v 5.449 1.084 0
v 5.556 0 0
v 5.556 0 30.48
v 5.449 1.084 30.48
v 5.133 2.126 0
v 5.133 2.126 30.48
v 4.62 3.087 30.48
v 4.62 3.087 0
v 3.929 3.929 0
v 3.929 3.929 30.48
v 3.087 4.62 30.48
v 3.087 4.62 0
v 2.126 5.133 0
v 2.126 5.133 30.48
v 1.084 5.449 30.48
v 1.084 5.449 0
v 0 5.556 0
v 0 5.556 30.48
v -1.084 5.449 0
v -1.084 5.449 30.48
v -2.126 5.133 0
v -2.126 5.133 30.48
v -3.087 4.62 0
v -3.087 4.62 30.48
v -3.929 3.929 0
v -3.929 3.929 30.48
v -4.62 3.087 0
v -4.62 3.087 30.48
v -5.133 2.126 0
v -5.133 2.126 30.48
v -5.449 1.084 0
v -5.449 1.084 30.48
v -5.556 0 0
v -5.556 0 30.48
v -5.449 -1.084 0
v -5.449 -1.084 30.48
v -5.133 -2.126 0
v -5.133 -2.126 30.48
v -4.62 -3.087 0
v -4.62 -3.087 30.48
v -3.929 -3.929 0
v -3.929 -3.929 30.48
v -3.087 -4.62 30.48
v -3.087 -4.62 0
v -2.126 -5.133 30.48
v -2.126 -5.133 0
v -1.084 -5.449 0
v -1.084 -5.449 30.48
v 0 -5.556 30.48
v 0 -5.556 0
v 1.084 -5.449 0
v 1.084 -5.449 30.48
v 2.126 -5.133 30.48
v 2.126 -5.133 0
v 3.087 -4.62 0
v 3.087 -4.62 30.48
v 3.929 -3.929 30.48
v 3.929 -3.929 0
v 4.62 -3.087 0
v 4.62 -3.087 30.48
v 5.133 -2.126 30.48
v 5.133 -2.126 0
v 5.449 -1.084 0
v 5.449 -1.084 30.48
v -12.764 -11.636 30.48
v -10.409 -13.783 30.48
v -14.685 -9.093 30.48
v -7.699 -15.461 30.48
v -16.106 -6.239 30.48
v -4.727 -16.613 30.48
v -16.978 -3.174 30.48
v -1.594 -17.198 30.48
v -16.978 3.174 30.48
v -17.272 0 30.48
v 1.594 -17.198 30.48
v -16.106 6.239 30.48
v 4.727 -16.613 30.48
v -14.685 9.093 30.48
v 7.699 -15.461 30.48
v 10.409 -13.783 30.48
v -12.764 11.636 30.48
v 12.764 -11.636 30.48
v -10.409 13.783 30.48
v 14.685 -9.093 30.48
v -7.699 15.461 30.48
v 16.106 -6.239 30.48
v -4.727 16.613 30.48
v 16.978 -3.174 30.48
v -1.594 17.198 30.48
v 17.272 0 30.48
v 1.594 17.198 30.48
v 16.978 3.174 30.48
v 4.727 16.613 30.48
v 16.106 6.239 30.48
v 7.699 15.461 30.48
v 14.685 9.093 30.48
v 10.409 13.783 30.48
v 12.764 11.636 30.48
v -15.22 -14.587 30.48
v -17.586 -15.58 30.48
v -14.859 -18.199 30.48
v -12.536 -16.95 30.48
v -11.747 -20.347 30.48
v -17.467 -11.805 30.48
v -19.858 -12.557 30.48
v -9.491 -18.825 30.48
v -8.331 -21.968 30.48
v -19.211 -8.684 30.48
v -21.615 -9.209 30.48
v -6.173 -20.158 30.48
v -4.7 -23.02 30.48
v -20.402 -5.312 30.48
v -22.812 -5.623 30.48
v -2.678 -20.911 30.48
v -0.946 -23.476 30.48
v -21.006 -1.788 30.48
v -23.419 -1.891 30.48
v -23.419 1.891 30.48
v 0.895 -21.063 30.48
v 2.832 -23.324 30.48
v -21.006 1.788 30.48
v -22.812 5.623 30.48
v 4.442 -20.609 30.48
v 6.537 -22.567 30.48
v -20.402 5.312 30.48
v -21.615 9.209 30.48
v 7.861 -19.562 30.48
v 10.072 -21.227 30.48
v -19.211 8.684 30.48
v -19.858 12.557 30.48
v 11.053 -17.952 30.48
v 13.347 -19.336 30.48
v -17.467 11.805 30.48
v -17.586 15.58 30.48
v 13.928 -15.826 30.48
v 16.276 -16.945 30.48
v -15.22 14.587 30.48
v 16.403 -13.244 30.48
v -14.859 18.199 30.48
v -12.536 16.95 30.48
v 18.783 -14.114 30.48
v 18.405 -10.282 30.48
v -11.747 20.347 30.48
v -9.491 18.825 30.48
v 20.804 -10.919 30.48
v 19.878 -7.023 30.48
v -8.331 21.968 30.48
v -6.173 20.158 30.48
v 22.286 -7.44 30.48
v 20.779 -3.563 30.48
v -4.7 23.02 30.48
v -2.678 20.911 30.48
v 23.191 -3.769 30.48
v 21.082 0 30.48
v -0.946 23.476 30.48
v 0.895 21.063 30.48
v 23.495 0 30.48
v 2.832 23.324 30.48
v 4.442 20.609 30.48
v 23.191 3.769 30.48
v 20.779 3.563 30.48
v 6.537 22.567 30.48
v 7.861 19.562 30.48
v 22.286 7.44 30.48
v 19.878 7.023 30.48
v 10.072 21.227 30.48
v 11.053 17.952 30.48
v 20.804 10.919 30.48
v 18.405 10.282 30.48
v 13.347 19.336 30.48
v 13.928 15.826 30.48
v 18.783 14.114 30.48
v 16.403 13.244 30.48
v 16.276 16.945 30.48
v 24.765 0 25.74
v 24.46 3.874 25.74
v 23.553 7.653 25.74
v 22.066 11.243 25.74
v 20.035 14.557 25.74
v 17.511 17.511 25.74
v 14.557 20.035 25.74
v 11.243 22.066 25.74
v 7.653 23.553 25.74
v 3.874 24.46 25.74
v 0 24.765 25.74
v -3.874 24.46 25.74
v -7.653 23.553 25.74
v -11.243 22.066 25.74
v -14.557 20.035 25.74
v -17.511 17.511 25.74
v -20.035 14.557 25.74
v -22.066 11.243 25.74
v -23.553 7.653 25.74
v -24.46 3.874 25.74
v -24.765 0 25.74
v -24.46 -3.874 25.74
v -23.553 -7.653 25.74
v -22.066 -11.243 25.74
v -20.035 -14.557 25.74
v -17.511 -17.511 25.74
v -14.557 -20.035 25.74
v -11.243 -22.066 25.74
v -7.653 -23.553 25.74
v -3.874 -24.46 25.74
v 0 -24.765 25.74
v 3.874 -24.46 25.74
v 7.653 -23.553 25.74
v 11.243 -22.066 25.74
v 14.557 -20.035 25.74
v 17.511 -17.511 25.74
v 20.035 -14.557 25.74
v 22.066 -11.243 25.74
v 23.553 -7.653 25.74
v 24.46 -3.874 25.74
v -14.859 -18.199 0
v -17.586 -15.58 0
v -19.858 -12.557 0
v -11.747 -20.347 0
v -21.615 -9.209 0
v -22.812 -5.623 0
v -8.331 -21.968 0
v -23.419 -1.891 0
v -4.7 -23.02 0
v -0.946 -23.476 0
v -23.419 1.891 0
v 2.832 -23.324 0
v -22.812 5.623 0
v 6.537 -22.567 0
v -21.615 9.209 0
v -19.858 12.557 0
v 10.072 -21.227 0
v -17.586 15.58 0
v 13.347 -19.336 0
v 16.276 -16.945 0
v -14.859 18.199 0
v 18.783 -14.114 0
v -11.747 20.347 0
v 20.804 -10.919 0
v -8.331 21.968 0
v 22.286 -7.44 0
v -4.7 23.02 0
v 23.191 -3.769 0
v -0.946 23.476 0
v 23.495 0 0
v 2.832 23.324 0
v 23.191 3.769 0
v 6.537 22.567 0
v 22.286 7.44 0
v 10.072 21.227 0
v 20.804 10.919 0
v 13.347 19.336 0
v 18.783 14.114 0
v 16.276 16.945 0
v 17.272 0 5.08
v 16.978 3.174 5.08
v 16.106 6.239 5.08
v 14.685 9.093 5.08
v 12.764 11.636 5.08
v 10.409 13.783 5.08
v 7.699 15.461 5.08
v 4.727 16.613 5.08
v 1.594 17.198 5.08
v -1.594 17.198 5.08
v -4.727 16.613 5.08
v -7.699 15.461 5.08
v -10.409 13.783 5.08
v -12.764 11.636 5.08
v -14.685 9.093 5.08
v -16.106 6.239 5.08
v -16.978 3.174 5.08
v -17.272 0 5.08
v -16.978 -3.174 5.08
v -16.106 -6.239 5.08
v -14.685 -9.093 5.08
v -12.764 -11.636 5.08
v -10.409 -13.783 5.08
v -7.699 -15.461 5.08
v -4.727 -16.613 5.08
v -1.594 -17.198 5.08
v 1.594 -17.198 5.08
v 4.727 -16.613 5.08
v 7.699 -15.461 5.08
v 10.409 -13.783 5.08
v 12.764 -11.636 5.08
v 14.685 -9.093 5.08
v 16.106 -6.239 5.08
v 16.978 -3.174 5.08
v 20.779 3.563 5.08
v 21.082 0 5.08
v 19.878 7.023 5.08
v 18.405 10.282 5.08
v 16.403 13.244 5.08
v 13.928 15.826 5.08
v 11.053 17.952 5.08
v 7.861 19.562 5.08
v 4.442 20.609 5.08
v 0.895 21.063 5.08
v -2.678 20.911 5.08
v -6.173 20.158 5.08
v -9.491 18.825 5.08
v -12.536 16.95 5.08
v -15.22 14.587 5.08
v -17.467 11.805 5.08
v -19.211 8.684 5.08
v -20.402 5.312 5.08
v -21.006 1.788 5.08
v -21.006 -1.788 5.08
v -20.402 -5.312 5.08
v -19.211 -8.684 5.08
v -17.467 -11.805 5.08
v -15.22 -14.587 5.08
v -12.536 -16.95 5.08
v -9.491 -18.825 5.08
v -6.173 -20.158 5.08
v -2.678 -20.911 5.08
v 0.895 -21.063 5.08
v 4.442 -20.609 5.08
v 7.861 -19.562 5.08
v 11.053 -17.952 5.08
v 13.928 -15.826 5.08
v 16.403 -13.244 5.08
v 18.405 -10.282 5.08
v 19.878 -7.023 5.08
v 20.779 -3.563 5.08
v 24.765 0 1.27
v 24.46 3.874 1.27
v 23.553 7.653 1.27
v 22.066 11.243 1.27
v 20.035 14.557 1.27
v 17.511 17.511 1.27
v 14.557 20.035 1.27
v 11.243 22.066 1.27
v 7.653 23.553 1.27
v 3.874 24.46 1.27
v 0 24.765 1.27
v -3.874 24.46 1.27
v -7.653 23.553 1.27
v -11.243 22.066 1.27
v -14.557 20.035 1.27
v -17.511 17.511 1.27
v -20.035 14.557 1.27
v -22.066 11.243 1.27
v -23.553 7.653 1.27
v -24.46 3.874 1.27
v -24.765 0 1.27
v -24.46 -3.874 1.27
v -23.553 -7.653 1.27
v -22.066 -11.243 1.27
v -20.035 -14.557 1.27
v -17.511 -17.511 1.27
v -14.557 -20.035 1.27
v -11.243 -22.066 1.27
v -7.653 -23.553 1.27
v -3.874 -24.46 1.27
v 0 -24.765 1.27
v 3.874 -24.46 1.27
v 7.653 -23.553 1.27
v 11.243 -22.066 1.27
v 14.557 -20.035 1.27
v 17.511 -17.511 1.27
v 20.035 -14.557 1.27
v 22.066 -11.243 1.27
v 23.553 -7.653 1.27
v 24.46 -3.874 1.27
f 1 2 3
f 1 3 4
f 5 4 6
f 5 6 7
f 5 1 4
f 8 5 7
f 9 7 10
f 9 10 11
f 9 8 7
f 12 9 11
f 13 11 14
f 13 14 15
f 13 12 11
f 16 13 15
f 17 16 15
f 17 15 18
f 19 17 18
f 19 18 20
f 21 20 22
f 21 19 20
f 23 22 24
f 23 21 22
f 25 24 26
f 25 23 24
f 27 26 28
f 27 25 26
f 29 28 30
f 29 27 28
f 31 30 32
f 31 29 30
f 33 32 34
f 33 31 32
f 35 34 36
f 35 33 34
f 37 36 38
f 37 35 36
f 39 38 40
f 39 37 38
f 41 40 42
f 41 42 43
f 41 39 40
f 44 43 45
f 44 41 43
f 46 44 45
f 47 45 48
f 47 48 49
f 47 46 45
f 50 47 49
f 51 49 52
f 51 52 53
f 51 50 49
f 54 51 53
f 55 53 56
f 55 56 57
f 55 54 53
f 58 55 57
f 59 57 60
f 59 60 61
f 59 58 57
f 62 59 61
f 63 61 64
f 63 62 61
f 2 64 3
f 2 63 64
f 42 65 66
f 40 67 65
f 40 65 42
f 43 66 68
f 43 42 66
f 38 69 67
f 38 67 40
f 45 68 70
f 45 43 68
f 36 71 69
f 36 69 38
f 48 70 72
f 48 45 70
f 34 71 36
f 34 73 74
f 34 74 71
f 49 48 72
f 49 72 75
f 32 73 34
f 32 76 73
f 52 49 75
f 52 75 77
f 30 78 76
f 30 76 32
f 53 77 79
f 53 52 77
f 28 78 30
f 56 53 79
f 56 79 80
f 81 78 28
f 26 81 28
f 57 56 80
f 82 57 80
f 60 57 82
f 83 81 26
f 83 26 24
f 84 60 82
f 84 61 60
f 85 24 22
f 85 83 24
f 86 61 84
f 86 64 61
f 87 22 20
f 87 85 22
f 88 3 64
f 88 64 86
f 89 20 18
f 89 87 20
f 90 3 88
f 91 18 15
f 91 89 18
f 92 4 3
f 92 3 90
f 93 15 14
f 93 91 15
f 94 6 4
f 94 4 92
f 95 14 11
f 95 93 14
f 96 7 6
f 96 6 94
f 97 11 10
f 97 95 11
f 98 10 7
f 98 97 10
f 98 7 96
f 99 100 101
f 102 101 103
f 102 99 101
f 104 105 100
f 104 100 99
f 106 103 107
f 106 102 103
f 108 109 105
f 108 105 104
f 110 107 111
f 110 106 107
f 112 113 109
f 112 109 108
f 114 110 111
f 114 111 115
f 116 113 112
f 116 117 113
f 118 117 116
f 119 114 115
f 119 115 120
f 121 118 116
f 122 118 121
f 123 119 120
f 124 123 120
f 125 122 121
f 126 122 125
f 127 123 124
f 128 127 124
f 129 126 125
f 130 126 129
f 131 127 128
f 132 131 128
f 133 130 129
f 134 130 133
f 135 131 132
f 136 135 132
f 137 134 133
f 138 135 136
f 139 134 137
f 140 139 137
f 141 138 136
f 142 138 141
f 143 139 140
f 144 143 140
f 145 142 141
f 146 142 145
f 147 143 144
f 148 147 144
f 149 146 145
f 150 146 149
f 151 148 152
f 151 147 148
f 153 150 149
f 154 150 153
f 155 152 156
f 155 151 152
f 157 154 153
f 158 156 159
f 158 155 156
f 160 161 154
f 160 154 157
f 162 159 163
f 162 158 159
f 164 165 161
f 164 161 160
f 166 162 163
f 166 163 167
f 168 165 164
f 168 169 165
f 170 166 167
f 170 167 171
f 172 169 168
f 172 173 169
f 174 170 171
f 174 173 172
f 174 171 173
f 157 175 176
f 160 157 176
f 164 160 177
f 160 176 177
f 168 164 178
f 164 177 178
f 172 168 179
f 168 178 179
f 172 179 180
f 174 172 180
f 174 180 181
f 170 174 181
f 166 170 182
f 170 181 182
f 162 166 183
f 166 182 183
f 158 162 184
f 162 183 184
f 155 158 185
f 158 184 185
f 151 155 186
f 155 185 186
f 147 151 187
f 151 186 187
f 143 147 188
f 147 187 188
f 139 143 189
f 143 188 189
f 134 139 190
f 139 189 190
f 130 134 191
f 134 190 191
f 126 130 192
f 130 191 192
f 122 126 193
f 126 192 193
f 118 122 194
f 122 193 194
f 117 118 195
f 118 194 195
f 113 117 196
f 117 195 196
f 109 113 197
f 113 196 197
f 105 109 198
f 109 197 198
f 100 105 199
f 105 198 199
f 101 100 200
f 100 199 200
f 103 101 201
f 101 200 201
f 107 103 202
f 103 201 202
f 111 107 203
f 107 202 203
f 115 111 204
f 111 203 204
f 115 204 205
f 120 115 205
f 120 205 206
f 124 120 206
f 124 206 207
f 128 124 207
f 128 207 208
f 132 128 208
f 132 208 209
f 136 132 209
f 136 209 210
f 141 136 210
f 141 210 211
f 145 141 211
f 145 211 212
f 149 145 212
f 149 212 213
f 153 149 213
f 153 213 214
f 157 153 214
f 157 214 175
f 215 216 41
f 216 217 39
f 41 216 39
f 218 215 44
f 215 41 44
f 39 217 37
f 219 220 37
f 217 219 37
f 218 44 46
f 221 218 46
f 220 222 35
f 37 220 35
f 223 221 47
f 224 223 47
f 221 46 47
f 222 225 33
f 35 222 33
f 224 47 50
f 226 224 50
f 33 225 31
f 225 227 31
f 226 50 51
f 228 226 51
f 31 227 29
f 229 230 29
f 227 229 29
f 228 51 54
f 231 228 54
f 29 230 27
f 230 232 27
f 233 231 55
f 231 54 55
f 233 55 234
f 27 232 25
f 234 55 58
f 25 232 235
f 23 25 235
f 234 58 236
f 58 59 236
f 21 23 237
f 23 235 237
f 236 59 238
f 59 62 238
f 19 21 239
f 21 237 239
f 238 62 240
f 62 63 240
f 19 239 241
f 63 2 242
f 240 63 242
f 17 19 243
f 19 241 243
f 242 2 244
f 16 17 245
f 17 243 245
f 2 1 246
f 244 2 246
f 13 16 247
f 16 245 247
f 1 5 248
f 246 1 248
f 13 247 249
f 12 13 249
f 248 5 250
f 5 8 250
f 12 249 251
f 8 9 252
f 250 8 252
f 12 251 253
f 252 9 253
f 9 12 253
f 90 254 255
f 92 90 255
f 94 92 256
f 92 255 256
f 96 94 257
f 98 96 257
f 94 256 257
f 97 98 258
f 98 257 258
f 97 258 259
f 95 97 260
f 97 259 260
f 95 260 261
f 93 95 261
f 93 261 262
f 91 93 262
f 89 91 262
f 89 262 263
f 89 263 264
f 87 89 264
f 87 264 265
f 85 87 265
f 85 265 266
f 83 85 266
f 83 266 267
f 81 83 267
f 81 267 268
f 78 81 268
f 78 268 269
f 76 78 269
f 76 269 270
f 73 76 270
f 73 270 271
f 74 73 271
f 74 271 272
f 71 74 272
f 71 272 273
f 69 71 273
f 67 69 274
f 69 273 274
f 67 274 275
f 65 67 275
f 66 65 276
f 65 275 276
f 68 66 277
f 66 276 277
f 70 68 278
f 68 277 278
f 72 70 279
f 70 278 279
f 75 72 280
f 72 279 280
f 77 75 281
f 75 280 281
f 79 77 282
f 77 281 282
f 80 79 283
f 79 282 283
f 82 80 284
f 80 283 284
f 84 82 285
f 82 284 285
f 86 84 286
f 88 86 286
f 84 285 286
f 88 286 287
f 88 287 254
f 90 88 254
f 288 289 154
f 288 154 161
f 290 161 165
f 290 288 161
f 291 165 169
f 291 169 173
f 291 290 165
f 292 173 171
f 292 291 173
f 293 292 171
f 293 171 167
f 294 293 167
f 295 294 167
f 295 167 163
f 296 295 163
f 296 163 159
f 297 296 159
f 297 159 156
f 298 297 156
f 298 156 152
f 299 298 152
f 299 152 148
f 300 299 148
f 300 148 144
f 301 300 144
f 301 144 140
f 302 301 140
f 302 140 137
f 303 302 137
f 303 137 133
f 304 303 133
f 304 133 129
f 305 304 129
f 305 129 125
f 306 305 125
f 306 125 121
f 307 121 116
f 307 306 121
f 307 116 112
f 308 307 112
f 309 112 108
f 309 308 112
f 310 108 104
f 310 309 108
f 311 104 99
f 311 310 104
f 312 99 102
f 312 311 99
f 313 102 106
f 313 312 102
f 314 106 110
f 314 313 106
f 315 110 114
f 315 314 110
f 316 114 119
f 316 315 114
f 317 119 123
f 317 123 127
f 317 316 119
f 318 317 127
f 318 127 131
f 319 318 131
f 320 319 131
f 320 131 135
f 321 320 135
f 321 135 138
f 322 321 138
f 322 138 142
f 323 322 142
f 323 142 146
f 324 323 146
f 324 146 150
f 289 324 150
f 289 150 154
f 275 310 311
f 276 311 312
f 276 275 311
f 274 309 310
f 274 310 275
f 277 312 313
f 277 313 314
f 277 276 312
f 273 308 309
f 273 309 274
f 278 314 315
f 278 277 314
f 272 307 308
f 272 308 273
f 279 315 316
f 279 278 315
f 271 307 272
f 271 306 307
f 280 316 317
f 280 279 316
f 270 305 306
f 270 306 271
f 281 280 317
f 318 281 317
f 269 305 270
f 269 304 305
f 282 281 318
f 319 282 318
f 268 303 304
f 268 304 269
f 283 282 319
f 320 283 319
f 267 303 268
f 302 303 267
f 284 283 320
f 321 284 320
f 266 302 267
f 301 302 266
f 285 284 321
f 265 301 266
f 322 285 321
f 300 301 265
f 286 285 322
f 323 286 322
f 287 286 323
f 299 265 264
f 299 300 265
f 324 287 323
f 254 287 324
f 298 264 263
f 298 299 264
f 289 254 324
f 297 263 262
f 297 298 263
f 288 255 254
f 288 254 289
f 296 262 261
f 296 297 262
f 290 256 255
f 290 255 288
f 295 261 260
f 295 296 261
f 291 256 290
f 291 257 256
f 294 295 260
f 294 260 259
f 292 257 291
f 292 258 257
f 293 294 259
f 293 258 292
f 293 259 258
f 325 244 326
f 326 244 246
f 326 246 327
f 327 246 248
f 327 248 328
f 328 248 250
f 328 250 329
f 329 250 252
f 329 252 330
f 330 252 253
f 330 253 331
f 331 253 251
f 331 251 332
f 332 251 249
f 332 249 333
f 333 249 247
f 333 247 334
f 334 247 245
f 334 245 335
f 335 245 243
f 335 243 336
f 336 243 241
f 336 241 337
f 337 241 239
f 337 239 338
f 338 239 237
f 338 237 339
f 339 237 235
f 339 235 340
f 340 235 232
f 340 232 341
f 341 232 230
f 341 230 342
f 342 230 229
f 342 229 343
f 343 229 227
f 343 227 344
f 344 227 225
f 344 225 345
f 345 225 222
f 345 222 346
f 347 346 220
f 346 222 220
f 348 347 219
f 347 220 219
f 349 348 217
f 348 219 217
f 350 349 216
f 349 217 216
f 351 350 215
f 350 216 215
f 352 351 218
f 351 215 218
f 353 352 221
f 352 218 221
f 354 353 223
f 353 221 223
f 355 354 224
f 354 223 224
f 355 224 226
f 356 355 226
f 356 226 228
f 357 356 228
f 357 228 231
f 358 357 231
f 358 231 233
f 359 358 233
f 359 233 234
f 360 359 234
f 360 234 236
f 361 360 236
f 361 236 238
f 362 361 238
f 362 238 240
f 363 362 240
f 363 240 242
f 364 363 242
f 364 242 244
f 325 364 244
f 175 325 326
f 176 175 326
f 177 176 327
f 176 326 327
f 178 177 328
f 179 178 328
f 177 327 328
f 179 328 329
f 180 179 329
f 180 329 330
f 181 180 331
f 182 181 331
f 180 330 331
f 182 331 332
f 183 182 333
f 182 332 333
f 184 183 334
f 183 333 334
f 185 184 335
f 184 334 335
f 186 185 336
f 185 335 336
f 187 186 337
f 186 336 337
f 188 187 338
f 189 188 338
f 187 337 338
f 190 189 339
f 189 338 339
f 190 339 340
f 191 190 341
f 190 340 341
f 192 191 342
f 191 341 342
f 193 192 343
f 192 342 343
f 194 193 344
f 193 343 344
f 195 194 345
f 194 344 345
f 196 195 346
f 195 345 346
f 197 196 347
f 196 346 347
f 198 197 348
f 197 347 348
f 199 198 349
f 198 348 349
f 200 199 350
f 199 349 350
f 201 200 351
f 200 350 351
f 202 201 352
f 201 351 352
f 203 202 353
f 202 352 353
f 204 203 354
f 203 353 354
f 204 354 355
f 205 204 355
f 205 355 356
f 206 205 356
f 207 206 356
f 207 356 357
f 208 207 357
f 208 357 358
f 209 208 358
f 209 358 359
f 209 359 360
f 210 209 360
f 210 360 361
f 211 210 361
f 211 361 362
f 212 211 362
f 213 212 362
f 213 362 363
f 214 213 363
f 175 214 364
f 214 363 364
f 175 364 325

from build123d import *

# Parameters (mm, degrees)
F0_R     = 24.765
F0_R_2   = 21.082
F1_DEPTH = 30.48
F0_R_3   = 17.272
F0_R_4   = 5.55625
F2_DEPTH = 5.08
F3_SIZE2 = 4.7397045256
F3_SIZE  = 1.27
F4_SIZE  = 1.27


with BuildPart() as f1:
    # F0 (on Top) → F1 (new body)
    with BuildSketch(Plane.XY):
        Circle(F0_R)
        Circle(F0_R_2, mode=Mode.SUBTRACT)
    extrude(amount=F1_DEPTH)



with BuildPart() as f1b:
    # F0 (on Top) → F1, piece 2 (new body)
    with BuildSketch(Plane.XY):
        Circle(F0_R_3)
        Circle(F0_R_4, mode=Mode.SUBTRACT)
    extrude(amount=F1_DEPTH)


with BuildPart() as f1_1:
    add(f1.part)

    add(f1b.part)  # F2 merges F1b
    # F0 (on Top) → F2 (join)
    with BuildSketch(Plane.XY):
        Circle(F0_R_2)
        Circle(F0_R_3, mode=Mode.SUBTRACT)
    extrude(amount=F2_DEPTH)

    # F3
    f3_edges = [f1_1.edges().sort_by_distance(p)[0] for p in [
        (-24.765, 0, 30.48),
    ]]
    f3_side = f1_1.faces().sort_by_distance((-24.06454, 0, 30.48))[0]
    chamfer(f3_edges, length=F3_SIZE, length2=F3_SIZE2, reference=f3_side)

    # F4
    f4_edges = [f1_1.edges().sort_by_distance(p)[0] for p in [
        (-24.765, 0, 0),
    ]]
    chamfer(f4_edges, length=F4_SIZE)


solid = f1_1.part
